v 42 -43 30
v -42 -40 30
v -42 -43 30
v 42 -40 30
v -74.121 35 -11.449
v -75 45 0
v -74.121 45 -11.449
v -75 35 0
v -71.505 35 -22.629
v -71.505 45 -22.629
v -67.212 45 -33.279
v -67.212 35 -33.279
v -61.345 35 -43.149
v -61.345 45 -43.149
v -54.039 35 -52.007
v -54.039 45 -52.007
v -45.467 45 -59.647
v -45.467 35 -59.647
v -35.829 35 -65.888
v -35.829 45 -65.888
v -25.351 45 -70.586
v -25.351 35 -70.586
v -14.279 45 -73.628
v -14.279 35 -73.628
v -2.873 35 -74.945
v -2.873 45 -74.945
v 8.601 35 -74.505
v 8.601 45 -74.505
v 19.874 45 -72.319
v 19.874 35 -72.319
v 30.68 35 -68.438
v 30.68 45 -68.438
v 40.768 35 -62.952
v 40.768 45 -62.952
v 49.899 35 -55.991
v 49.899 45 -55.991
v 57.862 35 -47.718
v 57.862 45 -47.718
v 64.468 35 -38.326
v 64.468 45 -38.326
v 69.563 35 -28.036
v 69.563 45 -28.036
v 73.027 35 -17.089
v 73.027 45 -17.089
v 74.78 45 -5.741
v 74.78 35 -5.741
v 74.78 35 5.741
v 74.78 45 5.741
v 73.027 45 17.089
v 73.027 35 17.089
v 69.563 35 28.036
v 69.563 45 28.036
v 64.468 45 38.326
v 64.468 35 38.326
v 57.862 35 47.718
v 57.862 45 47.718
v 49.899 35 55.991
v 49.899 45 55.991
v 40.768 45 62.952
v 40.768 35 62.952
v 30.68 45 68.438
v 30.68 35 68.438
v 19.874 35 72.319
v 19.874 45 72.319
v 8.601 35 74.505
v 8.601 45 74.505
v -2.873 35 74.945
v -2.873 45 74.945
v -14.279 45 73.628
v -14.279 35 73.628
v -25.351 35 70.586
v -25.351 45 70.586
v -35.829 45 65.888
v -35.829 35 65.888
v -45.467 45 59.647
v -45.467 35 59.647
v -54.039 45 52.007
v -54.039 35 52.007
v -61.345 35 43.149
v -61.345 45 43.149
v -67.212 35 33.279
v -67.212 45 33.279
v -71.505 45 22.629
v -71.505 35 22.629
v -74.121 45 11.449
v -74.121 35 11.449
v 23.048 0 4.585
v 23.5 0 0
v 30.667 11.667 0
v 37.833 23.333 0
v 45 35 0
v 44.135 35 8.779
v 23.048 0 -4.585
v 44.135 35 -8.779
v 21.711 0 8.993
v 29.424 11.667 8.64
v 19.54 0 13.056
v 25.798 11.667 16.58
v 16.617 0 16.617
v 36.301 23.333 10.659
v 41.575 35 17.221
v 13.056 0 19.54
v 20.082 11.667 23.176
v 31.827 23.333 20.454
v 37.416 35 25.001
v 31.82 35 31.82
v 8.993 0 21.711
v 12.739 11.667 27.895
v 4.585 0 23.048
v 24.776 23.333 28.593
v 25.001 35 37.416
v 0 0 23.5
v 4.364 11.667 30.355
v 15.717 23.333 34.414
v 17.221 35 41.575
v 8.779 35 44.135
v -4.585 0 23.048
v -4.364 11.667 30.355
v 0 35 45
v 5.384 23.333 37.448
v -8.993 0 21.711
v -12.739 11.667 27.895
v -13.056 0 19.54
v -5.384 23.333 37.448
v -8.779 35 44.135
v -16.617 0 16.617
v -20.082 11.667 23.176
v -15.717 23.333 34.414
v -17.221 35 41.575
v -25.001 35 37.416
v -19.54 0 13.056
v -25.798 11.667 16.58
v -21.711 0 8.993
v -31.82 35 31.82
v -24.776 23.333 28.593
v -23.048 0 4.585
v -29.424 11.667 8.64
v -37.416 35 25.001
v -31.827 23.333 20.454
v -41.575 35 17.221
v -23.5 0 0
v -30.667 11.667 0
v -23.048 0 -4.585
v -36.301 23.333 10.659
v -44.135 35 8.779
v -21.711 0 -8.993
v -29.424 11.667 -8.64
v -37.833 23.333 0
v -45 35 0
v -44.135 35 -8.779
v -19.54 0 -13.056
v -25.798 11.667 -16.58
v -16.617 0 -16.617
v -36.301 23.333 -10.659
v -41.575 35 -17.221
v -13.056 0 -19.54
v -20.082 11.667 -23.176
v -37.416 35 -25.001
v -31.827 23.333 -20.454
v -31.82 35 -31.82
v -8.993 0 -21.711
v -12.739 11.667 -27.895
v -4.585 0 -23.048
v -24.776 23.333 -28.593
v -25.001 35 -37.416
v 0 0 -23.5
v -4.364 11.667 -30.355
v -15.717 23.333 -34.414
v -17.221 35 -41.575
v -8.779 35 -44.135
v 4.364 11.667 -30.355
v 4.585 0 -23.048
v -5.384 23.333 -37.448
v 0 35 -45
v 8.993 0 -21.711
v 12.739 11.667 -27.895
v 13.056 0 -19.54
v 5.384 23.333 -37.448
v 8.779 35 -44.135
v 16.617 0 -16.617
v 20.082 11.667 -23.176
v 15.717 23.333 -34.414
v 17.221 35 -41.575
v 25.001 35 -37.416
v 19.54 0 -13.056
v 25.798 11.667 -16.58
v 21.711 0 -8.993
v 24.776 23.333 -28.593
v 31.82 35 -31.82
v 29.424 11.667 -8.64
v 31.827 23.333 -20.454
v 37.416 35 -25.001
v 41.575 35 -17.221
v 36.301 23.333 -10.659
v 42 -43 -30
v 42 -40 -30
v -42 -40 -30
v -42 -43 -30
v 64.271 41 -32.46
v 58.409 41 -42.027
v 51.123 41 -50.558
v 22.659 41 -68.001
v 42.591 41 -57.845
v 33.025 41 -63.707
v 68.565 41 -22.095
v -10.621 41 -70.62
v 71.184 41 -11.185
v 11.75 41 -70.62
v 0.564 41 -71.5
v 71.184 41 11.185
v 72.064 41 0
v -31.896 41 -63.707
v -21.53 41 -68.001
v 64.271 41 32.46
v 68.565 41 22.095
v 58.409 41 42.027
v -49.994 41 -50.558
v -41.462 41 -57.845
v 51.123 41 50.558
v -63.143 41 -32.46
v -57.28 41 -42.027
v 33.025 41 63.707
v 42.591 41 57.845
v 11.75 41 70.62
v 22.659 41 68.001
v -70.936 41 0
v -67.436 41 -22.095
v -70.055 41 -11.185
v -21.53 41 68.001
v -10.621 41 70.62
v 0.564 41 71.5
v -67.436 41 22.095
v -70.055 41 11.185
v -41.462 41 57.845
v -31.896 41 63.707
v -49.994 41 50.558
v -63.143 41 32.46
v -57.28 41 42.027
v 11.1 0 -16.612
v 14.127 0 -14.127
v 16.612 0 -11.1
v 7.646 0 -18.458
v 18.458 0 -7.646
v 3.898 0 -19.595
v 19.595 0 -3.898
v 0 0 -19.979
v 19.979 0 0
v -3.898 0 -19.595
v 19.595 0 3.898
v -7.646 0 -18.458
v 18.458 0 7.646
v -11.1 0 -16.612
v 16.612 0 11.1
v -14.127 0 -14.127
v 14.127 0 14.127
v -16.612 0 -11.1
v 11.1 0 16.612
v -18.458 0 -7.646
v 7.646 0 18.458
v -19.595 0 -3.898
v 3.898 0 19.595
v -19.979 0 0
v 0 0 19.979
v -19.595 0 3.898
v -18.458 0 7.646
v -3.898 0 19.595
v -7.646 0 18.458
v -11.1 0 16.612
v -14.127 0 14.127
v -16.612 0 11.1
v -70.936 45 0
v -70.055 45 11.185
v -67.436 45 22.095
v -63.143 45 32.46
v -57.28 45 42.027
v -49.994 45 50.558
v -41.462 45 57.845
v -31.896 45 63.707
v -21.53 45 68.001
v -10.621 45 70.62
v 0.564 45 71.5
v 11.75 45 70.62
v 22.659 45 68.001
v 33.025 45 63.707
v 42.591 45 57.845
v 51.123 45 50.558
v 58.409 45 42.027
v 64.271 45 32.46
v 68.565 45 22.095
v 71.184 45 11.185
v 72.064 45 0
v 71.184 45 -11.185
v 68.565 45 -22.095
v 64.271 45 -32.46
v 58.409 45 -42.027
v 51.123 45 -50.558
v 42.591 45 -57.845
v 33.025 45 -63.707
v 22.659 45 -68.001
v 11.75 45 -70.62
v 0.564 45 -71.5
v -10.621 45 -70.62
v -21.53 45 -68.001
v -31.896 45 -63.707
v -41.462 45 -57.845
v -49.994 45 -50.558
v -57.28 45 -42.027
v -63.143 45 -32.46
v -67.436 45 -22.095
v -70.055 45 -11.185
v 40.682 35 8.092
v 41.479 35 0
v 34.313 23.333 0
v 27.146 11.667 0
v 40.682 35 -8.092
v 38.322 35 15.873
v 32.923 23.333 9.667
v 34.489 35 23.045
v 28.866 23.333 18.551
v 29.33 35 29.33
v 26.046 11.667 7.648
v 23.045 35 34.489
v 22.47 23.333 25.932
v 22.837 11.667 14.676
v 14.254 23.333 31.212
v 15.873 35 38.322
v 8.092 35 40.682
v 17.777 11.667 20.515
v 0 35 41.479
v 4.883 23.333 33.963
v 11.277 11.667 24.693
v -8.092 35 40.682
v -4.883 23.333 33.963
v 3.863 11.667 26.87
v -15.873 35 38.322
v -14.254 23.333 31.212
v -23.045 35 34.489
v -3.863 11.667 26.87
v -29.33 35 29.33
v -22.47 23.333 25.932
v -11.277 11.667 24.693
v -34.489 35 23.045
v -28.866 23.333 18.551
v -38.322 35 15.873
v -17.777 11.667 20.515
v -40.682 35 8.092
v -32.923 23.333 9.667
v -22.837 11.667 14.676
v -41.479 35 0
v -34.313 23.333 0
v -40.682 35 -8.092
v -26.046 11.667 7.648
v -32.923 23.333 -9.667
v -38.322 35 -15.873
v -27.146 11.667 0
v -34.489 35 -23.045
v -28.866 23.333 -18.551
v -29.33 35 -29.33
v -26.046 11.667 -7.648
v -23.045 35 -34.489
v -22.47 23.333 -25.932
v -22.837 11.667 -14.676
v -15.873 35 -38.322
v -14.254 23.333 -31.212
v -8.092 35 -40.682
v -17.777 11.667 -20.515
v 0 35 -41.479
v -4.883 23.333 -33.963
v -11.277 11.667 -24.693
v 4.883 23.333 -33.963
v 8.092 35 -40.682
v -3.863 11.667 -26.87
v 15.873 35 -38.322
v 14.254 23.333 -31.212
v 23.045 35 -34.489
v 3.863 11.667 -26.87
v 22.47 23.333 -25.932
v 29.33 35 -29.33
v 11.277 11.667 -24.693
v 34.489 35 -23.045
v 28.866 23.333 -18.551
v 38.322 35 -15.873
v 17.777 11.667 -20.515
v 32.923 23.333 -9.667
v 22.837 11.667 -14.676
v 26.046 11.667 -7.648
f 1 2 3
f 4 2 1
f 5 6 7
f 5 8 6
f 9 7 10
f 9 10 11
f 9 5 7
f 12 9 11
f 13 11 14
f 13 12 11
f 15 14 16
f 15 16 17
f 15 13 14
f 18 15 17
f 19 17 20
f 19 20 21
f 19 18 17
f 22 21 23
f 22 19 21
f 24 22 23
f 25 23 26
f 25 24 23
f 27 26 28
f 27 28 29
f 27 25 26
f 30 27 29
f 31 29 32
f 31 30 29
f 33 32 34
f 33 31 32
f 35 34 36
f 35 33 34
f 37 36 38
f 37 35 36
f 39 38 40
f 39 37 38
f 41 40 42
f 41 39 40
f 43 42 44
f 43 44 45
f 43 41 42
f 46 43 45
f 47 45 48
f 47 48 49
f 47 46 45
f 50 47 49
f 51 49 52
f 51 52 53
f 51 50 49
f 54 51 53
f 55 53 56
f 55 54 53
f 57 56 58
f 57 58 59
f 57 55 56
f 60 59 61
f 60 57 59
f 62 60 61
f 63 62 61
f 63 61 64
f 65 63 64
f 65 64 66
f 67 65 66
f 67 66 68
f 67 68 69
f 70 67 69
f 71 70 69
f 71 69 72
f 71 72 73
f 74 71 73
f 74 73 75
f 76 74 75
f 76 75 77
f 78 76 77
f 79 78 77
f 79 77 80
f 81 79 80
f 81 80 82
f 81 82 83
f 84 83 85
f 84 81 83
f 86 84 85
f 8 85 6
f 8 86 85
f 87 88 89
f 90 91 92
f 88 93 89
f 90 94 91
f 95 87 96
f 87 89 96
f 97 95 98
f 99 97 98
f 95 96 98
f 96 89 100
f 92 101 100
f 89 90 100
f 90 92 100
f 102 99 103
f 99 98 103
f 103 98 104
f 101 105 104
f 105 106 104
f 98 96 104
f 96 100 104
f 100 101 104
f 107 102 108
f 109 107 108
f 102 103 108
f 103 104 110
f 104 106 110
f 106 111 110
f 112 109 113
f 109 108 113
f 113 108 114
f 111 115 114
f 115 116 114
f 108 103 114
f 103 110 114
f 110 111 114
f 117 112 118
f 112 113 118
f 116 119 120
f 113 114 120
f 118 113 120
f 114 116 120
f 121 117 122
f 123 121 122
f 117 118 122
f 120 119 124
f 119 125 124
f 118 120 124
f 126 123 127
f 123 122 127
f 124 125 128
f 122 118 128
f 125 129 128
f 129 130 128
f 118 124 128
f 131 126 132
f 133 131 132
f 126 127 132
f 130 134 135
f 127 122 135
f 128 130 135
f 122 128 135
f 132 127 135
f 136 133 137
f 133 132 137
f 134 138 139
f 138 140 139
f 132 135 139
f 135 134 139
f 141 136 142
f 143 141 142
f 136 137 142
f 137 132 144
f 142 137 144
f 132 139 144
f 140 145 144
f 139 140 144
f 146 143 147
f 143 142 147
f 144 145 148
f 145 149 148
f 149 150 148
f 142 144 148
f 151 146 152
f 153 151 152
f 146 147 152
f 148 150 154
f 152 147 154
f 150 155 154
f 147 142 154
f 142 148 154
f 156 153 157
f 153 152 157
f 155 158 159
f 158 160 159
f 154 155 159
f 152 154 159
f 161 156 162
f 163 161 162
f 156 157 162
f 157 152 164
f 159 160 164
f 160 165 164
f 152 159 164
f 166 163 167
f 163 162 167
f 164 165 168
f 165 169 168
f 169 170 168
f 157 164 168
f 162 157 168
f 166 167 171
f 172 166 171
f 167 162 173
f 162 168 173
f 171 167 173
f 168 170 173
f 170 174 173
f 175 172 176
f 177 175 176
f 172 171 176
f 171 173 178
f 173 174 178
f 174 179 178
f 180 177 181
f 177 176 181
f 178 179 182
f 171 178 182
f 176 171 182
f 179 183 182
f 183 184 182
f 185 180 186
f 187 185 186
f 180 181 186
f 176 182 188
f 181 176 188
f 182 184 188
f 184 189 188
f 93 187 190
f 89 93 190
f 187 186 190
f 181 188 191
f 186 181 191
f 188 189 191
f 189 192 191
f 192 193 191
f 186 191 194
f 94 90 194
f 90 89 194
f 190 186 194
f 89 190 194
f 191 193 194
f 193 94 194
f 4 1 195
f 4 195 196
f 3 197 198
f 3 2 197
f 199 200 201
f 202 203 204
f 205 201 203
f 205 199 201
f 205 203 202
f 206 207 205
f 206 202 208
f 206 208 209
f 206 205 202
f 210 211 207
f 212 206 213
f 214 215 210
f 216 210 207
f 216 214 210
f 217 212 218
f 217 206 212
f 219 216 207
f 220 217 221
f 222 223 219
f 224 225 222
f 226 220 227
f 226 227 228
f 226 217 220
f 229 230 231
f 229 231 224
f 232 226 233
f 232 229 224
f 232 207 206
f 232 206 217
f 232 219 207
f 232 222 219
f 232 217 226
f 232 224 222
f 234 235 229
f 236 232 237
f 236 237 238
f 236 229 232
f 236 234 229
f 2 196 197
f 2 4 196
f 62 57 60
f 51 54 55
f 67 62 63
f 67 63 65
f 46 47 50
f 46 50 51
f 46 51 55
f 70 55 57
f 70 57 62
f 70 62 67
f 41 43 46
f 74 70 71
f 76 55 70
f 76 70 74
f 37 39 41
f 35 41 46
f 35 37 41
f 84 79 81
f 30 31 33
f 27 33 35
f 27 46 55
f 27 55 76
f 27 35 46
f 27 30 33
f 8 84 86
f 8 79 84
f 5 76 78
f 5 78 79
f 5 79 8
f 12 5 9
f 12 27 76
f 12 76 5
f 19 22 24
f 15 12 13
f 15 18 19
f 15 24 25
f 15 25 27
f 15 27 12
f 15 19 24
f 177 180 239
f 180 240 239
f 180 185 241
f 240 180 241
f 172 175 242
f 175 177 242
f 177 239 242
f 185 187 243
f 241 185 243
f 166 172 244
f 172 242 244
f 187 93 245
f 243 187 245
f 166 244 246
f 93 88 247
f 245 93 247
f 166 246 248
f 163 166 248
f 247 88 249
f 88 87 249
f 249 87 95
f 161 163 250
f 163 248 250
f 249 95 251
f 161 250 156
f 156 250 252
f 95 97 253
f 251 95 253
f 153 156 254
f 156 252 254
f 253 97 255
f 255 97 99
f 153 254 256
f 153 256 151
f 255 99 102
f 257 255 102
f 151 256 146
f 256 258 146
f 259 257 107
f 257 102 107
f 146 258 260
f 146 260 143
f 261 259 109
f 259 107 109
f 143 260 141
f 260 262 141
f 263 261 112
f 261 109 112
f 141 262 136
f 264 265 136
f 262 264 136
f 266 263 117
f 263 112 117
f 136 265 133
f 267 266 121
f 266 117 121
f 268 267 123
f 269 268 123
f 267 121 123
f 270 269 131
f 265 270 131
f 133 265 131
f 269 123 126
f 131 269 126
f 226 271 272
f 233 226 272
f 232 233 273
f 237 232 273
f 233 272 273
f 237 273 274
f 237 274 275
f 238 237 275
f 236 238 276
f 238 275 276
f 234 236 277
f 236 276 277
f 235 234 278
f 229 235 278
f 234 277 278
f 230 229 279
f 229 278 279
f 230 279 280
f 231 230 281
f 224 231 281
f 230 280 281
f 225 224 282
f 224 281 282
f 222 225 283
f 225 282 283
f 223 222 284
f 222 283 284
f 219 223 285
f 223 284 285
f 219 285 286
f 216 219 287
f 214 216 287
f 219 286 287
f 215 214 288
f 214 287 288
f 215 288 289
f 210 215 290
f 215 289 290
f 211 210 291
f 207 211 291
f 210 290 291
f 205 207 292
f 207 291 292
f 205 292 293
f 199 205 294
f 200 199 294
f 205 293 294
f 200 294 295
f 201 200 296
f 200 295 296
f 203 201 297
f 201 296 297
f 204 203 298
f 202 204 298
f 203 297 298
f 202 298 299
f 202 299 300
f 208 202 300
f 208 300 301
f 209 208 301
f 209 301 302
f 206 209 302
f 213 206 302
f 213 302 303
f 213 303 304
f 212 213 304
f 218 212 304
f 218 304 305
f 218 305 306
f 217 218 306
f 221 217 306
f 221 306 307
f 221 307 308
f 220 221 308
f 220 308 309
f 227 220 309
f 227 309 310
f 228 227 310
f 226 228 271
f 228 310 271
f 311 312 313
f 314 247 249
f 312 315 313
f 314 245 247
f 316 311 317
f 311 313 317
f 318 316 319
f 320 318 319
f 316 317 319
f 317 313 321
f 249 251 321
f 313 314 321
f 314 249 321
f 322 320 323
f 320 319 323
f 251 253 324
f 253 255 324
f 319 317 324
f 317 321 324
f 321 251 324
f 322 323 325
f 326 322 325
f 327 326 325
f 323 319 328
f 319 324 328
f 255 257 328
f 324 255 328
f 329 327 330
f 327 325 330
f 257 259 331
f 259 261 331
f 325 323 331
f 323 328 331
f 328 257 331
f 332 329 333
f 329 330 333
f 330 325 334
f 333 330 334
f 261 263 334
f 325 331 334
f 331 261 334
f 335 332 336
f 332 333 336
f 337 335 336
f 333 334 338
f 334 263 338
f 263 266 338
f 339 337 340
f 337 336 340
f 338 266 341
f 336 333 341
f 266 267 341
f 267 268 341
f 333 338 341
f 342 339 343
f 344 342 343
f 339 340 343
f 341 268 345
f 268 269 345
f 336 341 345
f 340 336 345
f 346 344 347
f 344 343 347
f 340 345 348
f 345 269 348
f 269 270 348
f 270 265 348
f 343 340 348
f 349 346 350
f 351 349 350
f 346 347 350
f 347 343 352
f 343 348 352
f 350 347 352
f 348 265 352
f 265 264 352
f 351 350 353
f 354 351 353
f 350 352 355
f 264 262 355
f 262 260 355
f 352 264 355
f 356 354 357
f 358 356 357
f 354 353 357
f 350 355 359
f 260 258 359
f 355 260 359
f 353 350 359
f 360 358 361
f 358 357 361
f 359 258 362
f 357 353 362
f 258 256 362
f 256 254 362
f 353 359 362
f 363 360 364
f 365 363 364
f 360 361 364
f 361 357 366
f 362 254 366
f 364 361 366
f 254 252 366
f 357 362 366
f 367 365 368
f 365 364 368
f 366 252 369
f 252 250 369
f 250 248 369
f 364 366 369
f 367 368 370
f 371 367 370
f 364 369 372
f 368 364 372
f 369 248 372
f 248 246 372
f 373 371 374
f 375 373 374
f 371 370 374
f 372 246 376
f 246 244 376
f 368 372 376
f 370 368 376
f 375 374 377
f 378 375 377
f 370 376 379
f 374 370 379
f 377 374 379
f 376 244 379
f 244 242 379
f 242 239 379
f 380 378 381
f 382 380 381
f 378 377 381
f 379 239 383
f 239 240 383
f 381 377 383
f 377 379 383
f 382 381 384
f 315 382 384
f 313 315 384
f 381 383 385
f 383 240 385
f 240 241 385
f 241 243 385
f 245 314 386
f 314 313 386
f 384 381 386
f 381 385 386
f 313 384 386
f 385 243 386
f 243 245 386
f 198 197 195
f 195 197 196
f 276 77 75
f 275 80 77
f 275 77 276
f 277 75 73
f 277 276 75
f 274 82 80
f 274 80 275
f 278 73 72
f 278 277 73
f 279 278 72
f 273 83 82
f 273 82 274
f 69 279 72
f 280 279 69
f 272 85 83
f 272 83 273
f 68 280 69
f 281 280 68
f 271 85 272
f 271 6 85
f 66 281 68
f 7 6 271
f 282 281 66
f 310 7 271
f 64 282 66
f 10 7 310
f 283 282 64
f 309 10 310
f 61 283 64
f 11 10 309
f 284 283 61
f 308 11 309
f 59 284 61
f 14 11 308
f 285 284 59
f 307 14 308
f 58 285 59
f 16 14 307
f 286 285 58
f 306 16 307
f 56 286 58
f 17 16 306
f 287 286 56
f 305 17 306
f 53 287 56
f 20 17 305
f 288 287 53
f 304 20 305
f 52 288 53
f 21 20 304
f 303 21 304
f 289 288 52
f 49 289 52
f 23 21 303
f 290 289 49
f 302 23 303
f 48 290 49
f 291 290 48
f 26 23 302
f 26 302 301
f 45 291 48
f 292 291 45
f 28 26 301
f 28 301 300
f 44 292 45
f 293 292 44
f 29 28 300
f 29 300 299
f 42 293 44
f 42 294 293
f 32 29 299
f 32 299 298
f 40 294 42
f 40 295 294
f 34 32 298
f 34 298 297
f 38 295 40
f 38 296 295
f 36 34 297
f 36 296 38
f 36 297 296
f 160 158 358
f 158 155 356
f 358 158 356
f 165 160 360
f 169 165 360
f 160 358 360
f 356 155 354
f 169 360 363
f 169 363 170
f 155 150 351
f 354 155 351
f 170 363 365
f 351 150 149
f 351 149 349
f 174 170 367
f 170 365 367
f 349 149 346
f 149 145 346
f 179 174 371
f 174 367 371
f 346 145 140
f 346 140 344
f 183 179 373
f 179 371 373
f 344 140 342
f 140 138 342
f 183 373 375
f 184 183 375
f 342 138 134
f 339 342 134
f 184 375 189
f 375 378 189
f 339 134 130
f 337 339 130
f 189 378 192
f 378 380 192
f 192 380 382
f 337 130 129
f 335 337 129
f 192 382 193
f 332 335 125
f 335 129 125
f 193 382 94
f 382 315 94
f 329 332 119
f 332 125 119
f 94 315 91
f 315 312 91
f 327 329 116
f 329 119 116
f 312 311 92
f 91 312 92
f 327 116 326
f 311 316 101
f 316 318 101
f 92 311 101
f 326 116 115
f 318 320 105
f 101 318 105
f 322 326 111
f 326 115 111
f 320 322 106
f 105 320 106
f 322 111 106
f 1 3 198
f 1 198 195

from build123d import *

# Parameters (mm, degrees)
F1_DEPTH = 30
F4_R     = 71.5
F5_DEPTH = 4


with BuildPart() as f1:
    # F0 (on Top) → F1 (new body, symmetric)
    with BuildSketch(Plane.XY):
        Polygon((0, -40), (-23.5, -40), (-42, -40), (-42, -43), (0, -43), align=None)
        Polygon((23.5, -40), (0, -40), (0, -43), (42, -43), (42, -40), align=None)
    extrude(amount=F1_DEPTH, both=True)


with BuildPart() as f2:
    # F0 (on Top) → F2 (revolve)
    with BuildSketch(Plane.XY):
        Polygon((41.479187246, 35), (19.979187246, 0), (23.5, 0), (45, 35), align=None)
    revolve(axis=Axis((0, 17.5, 0), (0, -1, 0)))


with BuildPart() as f3:
    # F0 (on Top) → F3 (revolve)
    with BuildSketch(Plane.XY):
        Polygon((-75, 35), (-45, 35), (0, 35), (0, 45), (-75, 45), align=None)
    revolve(axis=Axis((0, 40, 0), (0, -1, 0)))

    # F4 (on face) → F5 (cut, symmetric)
    with BuildSketch(Plane(origin=(0, 45, 0), x_dir=(-1, 0, 0), z_dir=(0, 1, 0))):
        with Locations((-0.5644535995, 0)):
            Circle(F4_R)
    extrude(amount=F5_DEPTH, both=True, mode=Mode.SUBTRACT)


solid = Compound([f1.part, f2.part, f3.part])
